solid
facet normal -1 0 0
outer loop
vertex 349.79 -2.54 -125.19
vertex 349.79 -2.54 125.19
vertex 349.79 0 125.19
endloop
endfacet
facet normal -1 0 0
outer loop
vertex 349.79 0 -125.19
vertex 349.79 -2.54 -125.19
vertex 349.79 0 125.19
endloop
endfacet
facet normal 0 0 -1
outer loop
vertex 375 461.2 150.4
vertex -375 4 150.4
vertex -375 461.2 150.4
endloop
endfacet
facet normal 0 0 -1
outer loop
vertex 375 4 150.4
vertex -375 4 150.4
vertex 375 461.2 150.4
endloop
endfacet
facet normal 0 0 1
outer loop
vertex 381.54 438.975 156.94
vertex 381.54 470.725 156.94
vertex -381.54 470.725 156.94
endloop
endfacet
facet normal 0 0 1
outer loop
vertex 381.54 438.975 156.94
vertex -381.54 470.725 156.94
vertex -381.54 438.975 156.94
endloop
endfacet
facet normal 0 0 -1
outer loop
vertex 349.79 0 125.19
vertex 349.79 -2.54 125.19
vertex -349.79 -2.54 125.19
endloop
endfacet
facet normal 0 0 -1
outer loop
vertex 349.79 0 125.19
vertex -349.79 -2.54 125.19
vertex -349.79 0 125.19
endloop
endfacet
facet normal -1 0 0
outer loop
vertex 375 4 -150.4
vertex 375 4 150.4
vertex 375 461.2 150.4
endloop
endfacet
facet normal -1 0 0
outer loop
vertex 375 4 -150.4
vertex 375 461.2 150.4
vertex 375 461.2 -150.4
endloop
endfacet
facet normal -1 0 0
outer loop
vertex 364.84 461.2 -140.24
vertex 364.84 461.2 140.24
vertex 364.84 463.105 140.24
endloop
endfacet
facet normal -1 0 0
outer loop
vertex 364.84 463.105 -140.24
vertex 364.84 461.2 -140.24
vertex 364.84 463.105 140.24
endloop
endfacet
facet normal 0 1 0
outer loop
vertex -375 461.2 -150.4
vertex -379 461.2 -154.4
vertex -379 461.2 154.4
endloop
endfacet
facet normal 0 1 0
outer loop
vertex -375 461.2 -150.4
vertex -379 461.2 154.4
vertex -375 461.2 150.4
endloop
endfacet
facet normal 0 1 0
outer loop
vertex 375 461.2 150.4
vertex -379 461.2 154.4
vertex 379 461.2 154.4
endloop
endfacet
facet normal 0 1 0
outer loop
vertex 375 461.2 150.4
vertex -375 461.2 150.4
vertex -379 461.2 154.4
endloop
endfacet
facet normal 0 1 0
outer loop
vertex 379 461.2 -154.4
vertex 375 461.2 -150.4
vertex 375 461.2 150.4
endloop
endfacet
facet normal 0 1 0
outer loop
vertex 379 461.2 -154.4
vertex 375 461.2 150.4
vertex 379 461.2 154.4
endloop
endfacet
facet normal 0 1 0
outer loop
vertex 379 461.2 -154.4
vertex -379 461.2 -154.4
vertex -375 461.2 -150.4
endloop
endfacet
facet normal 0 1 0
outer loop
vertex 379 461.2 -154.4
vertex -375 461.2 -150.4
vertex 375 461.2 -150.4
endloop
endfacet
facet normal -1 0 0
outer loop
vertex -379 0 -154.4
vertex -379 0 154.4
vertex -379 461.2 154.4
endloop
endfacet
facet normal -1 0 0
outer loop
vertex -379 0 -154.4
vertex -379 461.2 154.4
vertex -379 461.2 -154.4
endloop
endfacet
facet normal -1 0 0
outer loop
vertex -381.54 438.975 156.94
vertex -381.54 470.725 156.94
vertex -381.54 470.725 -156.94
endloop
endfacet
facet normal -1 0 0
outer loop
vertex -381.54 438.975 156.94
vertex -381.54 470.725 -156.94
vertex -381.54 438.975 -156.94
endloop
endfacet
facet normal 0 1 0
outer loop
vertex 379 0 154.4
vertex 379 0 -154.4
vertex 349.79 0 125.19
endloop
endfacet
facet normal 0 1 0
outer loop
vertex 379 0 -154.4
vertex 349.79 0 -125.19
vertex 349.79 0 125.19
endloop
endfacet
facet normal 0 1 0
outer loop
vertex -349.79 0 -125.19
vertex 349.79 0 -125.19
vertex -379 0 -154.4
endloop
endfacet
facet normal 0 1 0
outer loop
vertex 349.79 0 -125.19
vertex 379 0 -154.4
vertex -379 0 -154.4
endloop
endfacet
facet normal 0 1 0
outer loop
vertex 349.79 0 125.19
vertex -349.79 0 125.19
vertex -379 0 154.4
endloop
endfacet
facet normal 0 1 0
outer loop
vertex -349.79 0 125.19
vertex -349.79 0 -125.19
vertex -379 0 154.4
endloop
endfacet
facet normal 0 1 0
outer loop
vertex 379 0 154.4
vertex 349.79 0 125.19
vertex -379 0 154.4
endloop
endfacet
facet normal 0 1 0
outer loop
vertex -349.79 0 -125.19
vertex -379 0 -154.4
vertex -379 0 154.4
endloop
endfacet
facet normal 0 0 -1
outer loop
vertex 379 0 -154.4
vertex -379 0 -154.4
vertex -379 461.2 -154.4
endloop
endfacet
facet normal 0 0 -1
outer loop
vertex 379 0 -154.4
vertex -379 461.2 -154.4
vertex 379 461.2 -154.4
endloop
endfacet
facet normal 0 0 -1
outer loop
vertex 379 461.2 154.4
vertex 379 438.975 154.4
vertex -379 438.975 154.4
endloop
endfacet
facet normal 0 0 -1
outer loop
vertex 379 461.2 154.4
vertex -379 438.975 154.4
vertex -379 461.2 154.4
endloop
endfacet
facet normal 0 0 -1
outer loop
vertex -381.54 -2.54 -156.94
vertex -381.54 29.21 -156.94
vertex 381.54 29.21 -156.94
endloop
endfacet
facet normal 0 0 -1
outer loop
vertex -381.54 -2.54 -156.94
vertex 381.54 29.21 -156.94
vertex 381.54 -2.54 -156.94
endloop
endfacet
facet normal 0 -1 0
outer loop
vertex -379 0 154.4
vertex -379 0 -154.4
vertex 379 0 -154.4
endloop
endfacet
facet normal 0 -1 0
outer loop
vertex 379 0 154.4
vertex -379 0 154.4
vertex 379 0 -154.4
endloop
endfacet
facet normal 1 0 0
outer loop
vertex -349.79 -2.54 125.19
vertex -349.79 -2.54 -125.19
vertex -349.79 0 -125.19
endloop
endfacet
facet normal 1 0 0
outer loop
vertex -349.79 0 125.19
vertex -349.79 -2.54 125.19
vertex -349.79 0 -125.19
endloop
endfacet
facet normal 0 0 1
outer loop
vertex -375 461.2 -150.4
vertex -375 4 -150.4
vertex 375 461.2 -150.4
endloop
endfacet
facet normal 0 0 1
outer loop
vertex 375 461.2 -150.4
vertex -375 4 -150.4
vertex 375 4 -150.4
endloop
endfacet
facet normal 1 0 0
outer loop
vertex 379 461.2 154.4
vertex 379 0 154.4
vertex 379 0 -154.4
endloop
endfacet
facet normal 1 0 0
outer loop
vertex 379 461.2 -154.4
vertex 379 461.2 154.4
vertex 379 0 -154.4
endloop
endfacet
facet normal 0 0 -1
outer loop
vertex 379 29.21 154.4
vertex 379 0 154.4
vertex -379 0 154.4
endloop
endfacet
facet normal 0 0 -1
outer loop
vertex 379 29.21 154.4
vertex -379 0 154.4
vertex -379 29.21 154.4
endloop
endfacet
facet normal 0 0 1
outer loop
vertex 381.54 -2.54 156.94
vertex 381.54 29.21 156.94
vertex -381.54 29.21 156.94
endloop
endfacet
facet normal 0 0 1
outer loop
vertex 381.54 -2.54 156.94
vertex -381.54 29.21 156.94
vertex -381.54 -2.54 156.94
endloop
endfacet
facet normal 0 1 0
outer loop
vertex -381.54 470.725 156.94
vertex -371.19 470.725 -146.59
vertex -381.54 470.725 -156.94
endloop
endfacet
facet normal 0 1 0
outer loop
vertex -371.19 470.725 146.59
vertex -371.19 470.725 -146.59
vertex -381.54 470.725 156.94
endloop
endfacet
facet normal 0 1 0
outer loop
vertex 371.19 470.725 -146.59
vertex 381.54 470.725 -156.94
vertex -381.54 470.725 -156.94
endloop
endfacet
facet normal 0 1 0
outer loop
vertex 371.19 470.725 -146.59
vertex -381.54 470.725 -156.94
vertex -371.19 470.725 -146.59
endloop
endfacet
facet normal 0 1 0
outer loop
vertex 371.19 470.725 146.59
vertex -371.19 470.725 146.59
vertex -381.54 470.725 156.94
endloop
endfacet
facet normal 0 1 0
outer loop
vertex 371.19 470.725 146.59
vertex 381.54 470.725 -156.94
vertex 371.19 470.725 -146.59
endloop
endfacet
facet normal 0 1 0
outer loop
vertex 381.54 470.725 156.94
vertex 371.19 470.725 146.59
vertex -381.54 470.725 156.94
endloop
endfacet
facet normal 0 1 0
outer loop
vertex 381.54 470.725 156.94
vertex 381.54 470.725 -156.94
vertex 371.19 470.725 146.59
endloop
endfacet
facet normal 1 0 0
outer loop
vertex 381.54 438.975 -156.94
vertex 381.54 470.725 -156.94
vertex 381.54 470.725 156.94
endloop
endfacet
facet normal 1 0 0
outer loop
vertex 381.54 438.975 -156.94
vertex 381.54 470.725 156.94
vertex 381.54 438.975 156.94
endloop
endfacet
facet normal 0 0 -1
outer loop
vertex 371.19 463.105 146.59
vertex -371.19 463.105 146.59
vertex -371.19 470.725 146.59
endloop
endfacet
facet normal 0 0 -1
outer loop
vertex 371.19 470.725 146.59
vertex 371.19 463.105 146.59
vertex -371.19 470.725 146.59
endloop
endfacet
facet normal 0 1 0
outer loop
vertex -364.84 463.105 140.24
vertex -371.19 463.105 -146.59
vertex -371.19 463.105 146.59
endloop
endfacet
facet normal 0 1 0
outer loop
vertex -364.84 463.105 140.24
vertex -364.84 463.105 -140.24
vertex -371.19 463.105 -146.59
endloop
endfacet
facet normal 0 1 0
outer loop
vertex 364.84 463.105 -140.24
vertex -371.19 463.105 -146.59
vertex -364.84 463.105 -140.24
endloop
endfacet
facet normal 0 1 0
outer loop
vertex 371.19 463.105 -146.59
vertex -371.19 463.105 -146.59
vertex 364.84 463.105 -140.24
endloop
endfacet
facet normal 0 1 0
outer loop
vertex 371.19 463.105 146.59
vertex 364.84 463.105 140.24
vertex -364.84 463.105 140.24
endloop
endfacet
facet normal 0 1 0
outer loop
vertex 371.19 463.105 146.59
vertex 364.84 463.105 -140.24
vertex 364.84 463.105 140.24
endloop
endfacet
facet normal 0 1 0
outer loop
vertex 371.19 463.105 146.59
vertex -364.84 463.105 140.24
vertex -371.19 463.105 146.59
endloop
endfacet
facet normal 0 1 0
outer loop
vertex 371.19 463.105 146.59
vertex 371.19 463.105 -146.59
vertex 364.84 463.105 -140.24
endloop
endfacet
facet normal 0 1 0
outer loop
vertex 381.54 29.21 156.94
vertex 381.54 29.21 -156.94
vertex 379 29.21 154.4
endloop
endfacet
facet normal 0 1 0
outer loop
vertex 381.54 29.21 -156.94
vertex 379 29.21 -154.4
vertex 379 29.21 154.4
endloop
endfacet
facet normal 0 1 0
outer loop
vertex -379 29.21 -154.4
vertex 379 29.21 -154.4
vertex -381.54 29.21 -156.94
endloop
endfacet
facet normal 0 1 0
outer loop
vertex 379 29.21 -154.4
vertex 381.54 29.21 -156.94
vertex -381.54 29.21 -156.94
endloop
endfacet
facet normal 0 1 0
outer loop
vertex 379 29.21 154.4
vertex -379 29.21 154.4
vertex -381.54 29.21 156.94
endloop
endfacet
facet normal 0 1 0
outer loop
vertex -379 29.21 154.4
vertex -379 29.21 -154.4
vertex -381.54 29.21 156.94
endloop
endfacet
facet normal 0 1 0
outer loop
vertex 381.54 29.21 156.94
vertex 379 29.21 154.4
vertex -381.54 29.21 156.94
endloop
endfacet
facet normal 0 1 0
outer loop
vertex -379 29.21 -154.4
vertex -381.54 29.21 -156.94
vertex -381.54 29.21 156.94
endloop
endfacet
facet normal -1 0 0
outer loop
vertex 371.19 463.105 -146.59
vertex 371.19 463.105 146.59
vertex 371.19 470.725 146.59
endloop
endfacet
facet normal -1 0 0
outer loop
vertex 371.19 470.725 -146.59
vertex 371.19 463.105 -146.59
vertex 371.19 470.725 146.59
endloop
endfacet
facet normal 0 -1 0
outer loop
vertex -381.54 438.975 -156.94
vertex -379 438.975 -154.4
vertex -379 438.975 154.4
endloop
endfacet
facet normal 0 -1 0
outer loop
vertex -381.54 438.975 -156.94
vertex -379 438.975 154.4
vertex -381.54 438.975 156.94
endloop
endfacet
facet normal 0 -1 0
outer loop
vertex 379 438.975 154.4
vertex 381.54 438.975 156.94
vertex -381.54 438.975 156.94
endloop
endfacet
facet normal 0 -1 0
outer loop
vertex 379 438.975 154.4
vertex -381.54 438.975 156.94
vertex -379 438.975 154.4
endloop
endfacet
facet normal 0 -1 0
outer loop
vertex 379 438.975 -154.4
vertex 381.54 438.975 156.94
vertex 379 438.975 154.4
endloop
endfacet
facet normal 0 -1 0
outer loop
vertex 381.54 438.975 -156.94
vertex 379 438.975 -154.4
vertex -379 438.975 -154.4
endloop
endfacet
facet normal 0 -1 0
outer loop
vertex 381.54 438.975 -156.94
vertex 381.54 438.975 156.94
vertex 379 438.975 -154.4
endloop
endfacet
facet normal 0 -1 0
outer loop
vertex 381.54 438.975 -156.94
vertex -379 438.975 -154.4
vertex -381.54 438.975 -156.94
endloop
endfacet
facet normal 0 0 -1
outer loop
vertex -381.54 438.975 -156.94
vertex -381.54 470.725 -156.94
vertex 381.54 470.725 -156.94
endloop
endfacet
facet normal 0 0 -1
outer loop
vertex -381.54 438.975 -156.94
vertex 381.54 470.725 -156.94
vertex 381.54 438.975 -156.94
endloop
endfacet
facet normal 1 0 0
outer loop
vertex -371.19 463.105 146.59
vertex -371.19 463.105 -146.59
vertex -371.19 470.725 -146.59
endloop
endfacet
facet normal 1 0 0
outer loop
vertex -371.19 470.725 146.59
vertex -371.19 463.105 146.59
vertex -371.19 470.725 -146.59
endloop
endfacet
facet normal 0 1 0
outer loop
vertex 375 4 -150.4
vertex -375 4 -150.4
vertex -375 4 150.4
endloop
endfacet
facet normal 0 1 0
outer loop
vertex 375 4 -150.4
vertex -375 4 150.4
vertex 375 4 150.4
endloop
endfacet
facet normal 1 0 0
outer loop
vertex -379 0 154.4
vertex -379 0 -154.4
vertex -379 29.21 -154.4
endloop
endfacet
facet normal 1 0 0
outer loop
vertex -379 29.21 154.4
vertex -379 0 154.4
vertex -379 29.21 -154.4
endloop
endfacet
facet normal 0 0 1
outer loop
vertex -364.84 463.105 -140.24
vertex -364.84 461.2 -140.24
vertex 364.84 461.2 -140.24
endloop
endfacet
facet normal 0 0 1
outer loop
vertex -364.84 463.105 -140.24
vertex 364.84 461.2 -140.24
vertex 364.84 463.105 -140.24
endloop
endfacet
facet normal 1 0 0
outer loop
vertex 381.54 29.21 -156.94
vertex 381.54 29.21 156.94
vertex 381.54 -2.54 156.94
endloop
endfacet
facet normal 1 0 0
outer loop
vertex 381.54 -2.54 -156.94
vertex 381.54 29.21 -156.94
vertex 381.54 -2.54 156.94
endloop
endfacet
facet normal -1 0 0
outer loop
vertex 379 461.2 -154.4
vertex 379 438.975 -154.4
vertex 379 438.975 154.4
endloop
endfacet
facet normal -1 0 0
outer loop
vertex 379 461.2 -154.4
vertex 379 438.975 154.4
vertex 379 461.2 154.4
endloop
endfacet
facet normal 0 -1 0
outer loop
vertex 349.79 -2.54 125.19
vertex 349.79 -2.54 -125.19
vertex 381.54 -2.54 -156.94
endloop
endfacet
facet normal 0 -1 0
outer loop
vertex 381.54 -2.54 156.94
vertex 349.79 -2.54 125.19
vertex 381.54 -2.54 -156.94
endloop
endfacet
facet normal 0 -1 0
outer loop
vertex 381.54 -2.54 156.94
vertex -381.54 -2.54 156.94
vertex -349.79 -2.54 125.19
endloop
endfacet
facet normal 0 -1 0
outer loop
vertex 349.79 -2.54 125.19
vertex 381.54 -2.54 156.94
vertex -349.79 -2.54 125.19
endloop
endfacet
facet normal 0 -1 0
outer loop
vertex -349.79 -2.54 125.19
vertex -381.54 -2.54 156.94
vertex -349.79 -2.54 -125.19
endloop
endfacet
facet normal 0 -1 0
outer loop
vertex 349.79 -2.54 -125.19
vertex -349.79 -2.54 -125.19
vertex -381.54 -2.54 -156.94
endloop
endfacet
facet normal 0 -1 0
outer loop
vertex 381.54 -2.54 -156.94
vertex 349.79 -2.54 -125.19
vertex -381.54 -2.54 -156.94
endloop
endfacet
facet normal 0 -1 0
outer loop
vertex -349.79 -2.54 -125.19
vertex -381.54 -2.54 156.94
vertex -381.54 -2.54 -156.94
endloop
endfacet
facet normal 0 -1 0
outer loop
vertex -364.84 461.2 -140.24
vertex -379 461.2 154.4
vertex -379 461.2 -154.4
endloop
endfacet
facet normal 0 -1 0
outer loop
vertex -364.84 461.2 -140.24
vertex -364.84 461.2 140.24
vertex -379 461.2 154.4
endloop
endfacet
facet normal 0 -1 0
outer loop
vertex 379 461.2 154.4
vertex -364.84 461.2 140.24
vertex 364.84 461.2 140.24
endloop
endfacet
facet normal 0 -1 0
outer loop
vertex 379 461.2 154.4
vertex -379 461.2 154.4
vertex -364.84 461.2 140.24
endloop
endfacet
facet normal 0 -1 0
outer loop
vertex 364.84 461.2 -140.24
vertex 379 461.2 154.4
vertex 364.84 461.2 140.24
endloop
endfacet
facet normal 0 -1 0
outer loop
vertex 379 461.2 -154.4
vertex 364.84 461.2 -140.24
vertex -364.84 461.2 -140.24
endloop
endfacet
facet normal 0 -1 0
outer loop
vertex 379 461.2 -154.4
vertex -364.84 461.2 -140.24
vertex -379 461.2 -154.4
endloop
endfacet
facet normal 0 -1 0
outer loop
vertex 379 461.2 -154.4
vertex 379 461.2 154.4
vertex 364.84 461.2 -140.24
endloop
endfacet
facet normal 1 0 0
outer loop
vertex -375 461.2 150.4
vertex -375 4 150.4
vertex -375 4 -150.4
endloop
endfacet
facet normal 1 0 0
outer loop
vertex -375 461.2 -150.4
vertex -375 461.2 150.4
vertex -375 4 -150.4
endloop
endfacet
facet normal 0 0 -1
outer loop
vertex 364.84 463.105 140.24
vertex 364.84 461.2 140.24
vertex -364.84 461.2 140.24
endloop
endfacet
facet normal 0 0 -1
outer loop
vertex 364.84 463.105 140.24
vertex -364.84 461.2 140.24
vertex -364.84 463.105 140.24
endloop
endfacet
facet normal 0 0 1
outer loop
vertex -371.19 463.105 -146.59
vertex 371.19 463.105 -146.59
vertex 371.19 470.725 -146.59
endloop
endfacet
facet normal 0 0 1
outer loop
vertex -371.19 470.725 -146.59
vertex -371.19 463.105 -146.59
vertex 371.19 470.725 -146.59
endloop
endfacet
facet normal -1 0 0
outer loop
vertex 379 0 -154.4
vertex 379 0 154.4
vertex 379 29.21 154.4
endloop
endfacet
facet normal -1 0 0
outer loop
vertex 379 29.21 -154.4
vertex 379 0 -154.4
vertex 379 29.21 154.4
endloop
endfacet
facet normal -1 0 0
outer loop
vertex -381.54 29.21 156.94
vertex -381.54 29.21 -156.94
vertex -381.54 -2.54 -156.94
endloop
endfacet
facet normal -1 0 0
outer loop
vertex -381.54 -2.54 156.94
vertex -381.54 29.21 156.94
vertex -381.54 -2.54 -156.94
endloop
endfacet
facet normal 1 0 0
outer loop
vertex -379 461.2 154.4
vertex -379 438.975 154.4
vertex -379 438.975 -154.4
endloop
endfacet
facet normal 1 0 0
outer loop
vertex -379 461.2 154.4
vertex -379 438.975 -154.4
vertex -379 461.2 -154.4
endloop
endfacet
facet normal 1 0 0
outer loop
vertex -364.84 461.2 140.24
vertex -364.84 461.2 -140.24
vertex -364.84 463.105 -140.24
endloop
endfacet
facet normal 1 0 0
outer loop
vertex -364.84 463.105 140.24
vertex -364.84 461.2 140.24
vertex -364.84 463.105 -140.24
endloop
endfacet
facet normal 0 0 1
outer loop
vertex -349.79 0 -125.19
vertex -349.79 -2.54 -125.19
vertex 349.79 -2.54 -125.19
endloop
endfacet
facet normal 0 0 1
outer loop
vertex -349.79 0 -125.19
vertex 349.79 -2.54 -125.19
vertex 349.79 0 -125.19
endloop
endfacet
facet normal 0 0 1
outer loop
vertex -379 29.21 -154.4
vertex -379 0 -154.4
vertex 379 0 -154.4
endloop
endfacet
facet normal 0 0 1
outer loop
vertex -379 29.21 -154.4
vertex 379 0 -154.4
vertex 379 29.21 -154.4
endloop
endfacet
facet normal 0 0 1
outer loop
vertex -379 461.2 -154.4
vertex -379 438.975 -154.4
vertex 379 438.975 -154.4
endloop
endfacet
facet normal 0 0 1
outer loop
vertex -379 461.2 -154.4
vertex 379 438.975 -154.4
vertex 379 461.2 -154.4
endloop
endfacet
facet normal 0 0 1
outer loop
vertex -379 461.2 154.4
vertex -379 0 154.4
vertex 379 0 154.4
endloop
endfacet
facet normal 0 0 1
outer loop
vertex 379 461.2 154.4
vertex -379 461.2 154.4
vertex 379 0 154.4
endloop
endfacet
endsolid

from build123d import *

# Parameters (mm, degrees)
SKETCH1_W        = 757.999999998
SKETCH1_H        = 308.8
SKETCH1_W_2      = 749.999999998
SKETCH1_H_2      = 300.8
TANK_WALLS_DEPTH = 461.2
SKETCH1_2_W      = 757.999999998
SKETCH1_2_H      = 308.8
TANK_FLOOR_DEPTH = 4


with BuildPart() as part:
    # Sketch1 → Tank Walls (new body)
    with BuildSketch(Plane(origin=(0, 0, 0), x_dir=(1, 0, 0), z_dir=(0, 1, 0))):
        Rectangle(SKETCH1_W, SKETCH1_H)
        Rectangle(SKETCH1_W_2, SKETCH1_H_2, mode=Mode.SUBTRACT)
    extrude(amount=TANK_WALLS_DEPTH)

    # Sketch1<2> → Tank Floor (add)
    with BuildSketch(Plane(origin=(0, 0, 0), x_dir=(1, 0, 0), z_dir=(0, 1, 0))):
        Rectangle(SKETCH1_2_W, SKETCH1_2_H)
    extrude(amount=TANK_FLOOR_DEPTH)


with BuildPart() as body_2:
    # Top Rim: sweep along a path in Sketch3
    with BuildLine(Plane(origin=(0, 461.2, 0), x_dir=(1, 0, 0), z_dir=(0, 1, 0))) as top_rim_path:
        Line((-378.999999999, -154.4), (378.999999999, -154.4))
        Line((378.999999999, -154.4), (378.999999999, 154.4))
        Line((378.999999999, 154.4), (-378.999999999, 154.4))
        Line((-378.999999999, 154.4), (-378.999999999, -154.4))
    # Sketch2 → Top Rim (sweep)
    with BuildSketch(Plane.XY):
        Polygon((-378.999999999, 461.2), (-364.839999999, 461.2), (-364.839999999, 463.105), (-371.189999999, 463.105), (-371.189999999, 470.725), (-381.539999999, 470.725), (-381.539999999, 438.975), (-378.999999999, 438.975), align=None)
    sweep(path=top_rim_path.line, transition=Transition.RIGHT)


with BuildPart() as body_3:
    # Bottom Rim: sweep along a path in Sketch5
    with BuildLine(Plane.XZ) as bottom_rim_path:
        Line((378.999999999, 154.4), (-378.999999999, 154.4))
        Line((-378.999999999, 154.4), (-378.999999999, -154.4))
        Line((-378.999999999, -154.4), (378.999999999, -154.4))
        Line((378.999999999, -154.4), (378.999999999, 154.4))
    # Sketch4 → Bottom Rim (sweep)
    with BuildSketch(Plane.XY):
        Polygon((-378.999999999, 0), (-378.999999999, 29.21), (-381.539999999, 29.21), (-381.539999999, -2.54), (-349.789999999, -2.54), (-349.789999999, 0), align=None)
    sweep(path=bottom_rim_path.line, transition=Transition.RIGHT)


solid = Compound([part.part, body_2.part, body_3.part])
